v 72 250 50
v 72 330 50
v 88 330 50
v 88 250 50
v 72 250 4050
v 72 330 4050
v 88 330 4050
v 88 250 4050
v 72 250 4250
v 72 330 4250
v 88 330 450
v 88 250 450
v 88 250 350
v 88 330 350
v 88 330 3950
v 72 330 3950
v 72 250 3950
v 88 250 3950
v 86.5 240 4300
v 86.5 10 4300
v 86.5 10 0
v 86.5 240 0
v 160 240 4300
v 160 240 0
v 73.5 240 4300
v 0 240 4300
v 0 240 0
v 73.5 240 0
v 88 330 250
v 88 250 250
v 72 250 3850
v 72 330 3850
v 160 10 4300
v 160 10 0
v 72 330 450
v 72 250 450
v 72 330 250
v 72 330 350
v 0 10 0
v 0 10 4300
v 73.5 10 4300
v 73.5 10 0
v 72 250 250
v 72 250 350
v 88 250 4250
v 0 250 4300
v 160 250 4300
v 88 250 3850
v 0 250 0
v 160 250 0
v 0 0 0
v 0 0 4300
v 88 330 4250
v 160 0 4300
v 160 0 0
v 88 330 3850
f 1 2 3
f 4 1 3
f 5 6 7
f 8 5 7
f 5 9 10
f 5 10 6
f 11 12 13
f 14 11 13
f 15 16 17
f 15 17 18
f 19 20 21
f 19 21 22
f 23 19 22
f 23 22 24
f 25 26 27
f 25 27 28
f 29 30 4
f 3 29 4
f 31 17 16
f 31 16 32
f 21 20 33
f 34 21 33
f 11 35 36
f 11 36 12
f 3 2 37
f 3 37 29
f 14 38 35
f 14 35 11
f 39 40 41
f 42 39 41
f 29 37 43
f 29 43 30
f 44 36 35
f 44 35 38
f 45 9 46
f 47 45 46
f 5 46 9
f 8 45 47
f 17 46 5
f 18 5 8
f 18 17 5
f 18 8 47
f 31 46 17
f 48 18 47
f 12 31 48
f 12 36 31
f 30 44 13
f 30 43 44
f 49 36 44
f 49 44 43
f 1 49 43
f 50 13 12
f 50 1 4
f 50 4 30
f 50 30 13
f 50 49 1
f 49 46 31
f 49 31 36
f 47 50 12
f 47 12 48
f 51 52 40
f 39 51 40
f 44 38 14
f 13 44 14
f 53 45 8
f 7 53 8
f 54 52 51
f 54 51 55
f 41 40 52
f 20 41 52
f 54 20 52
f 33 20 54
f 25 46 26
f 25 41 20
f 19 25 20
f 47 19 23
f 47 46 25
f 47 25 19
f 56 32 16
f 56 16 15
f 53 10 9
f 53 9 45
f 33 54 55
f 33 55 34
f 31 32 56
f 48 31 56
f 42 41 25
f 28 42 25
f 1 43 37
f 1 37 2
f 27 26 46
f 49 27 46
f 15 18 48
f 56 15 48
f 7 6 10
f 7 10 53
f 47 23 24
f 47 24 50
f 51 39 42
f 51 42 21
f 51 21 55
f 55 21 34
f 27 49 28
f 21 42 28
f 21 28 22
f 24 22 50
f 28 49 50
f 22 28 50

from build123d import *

# Parameters (mm, degrees)
SKETCH_2_W          = 160
SKETCH_2_H          = 250
EXTRUDE_1_DEPTH     = 4300
SKETCH_3_W          = 73.5
SKETCH_3_H          = 230
CUT_EXTRUDE_1_DEPTH = 4311.232012317
SKETCH_4_W          = 16
SKETCH_4_H          = 200
SKETCH_4_H_2        = 100
EXTRUDE_2_DEPTH     = 80


with BuildPart() as part:
    # 草图2 → 凸台-拉伸1 (new body)
    with BuildSketch(Plane.XY):
        with Locations((80, 125)):
            Rectangle(SKETCH_2_W, SKETCH_2_H)
    extrude(amount=EXTRUDE_1_DEPTH)

    # 草图3 → 切除-拉伸1 (cut, through all)
    with BuildSketch(Plane.XY.offset(4300)):
        with Locations((123.25, 125)):
            Rectangle(SKETCH_3_W, SKETCH_3_H)
        with Locations((36.75, 125)):
            Rectangle(SKETCH_3_W, SKETCH_3_H)
    extrude(amount=-CUT_EXTRUDE_1_DEPTH, mode=Mode.SUBTRACT)

    # 草图4 → 凸台-拉伸2 (add)
    with BuildSketch(Plane(origin=(0, 250, 0), x_dir=(1, 0, 0), z_dir=(0, 1, 0))):
        with Locations((80, -150)):
            Rectangle(SKETCH_4_W, SKETCH_4_H)
        with Locations((80, -400)):
            Rectangle(SKETCH_4_W, SKETCH_4_H_2)
        with Locations((80, -4150)):
            Rectangle(SKETCH_4_W, SKETCH_4_H)
        with Locations((80, -3900)):
            Rectangle(SKETCH_4_W, SKETCH_4_H_2)
    extrude(amount=EXTRUDE_2_DEPTH)


solid = part.part
